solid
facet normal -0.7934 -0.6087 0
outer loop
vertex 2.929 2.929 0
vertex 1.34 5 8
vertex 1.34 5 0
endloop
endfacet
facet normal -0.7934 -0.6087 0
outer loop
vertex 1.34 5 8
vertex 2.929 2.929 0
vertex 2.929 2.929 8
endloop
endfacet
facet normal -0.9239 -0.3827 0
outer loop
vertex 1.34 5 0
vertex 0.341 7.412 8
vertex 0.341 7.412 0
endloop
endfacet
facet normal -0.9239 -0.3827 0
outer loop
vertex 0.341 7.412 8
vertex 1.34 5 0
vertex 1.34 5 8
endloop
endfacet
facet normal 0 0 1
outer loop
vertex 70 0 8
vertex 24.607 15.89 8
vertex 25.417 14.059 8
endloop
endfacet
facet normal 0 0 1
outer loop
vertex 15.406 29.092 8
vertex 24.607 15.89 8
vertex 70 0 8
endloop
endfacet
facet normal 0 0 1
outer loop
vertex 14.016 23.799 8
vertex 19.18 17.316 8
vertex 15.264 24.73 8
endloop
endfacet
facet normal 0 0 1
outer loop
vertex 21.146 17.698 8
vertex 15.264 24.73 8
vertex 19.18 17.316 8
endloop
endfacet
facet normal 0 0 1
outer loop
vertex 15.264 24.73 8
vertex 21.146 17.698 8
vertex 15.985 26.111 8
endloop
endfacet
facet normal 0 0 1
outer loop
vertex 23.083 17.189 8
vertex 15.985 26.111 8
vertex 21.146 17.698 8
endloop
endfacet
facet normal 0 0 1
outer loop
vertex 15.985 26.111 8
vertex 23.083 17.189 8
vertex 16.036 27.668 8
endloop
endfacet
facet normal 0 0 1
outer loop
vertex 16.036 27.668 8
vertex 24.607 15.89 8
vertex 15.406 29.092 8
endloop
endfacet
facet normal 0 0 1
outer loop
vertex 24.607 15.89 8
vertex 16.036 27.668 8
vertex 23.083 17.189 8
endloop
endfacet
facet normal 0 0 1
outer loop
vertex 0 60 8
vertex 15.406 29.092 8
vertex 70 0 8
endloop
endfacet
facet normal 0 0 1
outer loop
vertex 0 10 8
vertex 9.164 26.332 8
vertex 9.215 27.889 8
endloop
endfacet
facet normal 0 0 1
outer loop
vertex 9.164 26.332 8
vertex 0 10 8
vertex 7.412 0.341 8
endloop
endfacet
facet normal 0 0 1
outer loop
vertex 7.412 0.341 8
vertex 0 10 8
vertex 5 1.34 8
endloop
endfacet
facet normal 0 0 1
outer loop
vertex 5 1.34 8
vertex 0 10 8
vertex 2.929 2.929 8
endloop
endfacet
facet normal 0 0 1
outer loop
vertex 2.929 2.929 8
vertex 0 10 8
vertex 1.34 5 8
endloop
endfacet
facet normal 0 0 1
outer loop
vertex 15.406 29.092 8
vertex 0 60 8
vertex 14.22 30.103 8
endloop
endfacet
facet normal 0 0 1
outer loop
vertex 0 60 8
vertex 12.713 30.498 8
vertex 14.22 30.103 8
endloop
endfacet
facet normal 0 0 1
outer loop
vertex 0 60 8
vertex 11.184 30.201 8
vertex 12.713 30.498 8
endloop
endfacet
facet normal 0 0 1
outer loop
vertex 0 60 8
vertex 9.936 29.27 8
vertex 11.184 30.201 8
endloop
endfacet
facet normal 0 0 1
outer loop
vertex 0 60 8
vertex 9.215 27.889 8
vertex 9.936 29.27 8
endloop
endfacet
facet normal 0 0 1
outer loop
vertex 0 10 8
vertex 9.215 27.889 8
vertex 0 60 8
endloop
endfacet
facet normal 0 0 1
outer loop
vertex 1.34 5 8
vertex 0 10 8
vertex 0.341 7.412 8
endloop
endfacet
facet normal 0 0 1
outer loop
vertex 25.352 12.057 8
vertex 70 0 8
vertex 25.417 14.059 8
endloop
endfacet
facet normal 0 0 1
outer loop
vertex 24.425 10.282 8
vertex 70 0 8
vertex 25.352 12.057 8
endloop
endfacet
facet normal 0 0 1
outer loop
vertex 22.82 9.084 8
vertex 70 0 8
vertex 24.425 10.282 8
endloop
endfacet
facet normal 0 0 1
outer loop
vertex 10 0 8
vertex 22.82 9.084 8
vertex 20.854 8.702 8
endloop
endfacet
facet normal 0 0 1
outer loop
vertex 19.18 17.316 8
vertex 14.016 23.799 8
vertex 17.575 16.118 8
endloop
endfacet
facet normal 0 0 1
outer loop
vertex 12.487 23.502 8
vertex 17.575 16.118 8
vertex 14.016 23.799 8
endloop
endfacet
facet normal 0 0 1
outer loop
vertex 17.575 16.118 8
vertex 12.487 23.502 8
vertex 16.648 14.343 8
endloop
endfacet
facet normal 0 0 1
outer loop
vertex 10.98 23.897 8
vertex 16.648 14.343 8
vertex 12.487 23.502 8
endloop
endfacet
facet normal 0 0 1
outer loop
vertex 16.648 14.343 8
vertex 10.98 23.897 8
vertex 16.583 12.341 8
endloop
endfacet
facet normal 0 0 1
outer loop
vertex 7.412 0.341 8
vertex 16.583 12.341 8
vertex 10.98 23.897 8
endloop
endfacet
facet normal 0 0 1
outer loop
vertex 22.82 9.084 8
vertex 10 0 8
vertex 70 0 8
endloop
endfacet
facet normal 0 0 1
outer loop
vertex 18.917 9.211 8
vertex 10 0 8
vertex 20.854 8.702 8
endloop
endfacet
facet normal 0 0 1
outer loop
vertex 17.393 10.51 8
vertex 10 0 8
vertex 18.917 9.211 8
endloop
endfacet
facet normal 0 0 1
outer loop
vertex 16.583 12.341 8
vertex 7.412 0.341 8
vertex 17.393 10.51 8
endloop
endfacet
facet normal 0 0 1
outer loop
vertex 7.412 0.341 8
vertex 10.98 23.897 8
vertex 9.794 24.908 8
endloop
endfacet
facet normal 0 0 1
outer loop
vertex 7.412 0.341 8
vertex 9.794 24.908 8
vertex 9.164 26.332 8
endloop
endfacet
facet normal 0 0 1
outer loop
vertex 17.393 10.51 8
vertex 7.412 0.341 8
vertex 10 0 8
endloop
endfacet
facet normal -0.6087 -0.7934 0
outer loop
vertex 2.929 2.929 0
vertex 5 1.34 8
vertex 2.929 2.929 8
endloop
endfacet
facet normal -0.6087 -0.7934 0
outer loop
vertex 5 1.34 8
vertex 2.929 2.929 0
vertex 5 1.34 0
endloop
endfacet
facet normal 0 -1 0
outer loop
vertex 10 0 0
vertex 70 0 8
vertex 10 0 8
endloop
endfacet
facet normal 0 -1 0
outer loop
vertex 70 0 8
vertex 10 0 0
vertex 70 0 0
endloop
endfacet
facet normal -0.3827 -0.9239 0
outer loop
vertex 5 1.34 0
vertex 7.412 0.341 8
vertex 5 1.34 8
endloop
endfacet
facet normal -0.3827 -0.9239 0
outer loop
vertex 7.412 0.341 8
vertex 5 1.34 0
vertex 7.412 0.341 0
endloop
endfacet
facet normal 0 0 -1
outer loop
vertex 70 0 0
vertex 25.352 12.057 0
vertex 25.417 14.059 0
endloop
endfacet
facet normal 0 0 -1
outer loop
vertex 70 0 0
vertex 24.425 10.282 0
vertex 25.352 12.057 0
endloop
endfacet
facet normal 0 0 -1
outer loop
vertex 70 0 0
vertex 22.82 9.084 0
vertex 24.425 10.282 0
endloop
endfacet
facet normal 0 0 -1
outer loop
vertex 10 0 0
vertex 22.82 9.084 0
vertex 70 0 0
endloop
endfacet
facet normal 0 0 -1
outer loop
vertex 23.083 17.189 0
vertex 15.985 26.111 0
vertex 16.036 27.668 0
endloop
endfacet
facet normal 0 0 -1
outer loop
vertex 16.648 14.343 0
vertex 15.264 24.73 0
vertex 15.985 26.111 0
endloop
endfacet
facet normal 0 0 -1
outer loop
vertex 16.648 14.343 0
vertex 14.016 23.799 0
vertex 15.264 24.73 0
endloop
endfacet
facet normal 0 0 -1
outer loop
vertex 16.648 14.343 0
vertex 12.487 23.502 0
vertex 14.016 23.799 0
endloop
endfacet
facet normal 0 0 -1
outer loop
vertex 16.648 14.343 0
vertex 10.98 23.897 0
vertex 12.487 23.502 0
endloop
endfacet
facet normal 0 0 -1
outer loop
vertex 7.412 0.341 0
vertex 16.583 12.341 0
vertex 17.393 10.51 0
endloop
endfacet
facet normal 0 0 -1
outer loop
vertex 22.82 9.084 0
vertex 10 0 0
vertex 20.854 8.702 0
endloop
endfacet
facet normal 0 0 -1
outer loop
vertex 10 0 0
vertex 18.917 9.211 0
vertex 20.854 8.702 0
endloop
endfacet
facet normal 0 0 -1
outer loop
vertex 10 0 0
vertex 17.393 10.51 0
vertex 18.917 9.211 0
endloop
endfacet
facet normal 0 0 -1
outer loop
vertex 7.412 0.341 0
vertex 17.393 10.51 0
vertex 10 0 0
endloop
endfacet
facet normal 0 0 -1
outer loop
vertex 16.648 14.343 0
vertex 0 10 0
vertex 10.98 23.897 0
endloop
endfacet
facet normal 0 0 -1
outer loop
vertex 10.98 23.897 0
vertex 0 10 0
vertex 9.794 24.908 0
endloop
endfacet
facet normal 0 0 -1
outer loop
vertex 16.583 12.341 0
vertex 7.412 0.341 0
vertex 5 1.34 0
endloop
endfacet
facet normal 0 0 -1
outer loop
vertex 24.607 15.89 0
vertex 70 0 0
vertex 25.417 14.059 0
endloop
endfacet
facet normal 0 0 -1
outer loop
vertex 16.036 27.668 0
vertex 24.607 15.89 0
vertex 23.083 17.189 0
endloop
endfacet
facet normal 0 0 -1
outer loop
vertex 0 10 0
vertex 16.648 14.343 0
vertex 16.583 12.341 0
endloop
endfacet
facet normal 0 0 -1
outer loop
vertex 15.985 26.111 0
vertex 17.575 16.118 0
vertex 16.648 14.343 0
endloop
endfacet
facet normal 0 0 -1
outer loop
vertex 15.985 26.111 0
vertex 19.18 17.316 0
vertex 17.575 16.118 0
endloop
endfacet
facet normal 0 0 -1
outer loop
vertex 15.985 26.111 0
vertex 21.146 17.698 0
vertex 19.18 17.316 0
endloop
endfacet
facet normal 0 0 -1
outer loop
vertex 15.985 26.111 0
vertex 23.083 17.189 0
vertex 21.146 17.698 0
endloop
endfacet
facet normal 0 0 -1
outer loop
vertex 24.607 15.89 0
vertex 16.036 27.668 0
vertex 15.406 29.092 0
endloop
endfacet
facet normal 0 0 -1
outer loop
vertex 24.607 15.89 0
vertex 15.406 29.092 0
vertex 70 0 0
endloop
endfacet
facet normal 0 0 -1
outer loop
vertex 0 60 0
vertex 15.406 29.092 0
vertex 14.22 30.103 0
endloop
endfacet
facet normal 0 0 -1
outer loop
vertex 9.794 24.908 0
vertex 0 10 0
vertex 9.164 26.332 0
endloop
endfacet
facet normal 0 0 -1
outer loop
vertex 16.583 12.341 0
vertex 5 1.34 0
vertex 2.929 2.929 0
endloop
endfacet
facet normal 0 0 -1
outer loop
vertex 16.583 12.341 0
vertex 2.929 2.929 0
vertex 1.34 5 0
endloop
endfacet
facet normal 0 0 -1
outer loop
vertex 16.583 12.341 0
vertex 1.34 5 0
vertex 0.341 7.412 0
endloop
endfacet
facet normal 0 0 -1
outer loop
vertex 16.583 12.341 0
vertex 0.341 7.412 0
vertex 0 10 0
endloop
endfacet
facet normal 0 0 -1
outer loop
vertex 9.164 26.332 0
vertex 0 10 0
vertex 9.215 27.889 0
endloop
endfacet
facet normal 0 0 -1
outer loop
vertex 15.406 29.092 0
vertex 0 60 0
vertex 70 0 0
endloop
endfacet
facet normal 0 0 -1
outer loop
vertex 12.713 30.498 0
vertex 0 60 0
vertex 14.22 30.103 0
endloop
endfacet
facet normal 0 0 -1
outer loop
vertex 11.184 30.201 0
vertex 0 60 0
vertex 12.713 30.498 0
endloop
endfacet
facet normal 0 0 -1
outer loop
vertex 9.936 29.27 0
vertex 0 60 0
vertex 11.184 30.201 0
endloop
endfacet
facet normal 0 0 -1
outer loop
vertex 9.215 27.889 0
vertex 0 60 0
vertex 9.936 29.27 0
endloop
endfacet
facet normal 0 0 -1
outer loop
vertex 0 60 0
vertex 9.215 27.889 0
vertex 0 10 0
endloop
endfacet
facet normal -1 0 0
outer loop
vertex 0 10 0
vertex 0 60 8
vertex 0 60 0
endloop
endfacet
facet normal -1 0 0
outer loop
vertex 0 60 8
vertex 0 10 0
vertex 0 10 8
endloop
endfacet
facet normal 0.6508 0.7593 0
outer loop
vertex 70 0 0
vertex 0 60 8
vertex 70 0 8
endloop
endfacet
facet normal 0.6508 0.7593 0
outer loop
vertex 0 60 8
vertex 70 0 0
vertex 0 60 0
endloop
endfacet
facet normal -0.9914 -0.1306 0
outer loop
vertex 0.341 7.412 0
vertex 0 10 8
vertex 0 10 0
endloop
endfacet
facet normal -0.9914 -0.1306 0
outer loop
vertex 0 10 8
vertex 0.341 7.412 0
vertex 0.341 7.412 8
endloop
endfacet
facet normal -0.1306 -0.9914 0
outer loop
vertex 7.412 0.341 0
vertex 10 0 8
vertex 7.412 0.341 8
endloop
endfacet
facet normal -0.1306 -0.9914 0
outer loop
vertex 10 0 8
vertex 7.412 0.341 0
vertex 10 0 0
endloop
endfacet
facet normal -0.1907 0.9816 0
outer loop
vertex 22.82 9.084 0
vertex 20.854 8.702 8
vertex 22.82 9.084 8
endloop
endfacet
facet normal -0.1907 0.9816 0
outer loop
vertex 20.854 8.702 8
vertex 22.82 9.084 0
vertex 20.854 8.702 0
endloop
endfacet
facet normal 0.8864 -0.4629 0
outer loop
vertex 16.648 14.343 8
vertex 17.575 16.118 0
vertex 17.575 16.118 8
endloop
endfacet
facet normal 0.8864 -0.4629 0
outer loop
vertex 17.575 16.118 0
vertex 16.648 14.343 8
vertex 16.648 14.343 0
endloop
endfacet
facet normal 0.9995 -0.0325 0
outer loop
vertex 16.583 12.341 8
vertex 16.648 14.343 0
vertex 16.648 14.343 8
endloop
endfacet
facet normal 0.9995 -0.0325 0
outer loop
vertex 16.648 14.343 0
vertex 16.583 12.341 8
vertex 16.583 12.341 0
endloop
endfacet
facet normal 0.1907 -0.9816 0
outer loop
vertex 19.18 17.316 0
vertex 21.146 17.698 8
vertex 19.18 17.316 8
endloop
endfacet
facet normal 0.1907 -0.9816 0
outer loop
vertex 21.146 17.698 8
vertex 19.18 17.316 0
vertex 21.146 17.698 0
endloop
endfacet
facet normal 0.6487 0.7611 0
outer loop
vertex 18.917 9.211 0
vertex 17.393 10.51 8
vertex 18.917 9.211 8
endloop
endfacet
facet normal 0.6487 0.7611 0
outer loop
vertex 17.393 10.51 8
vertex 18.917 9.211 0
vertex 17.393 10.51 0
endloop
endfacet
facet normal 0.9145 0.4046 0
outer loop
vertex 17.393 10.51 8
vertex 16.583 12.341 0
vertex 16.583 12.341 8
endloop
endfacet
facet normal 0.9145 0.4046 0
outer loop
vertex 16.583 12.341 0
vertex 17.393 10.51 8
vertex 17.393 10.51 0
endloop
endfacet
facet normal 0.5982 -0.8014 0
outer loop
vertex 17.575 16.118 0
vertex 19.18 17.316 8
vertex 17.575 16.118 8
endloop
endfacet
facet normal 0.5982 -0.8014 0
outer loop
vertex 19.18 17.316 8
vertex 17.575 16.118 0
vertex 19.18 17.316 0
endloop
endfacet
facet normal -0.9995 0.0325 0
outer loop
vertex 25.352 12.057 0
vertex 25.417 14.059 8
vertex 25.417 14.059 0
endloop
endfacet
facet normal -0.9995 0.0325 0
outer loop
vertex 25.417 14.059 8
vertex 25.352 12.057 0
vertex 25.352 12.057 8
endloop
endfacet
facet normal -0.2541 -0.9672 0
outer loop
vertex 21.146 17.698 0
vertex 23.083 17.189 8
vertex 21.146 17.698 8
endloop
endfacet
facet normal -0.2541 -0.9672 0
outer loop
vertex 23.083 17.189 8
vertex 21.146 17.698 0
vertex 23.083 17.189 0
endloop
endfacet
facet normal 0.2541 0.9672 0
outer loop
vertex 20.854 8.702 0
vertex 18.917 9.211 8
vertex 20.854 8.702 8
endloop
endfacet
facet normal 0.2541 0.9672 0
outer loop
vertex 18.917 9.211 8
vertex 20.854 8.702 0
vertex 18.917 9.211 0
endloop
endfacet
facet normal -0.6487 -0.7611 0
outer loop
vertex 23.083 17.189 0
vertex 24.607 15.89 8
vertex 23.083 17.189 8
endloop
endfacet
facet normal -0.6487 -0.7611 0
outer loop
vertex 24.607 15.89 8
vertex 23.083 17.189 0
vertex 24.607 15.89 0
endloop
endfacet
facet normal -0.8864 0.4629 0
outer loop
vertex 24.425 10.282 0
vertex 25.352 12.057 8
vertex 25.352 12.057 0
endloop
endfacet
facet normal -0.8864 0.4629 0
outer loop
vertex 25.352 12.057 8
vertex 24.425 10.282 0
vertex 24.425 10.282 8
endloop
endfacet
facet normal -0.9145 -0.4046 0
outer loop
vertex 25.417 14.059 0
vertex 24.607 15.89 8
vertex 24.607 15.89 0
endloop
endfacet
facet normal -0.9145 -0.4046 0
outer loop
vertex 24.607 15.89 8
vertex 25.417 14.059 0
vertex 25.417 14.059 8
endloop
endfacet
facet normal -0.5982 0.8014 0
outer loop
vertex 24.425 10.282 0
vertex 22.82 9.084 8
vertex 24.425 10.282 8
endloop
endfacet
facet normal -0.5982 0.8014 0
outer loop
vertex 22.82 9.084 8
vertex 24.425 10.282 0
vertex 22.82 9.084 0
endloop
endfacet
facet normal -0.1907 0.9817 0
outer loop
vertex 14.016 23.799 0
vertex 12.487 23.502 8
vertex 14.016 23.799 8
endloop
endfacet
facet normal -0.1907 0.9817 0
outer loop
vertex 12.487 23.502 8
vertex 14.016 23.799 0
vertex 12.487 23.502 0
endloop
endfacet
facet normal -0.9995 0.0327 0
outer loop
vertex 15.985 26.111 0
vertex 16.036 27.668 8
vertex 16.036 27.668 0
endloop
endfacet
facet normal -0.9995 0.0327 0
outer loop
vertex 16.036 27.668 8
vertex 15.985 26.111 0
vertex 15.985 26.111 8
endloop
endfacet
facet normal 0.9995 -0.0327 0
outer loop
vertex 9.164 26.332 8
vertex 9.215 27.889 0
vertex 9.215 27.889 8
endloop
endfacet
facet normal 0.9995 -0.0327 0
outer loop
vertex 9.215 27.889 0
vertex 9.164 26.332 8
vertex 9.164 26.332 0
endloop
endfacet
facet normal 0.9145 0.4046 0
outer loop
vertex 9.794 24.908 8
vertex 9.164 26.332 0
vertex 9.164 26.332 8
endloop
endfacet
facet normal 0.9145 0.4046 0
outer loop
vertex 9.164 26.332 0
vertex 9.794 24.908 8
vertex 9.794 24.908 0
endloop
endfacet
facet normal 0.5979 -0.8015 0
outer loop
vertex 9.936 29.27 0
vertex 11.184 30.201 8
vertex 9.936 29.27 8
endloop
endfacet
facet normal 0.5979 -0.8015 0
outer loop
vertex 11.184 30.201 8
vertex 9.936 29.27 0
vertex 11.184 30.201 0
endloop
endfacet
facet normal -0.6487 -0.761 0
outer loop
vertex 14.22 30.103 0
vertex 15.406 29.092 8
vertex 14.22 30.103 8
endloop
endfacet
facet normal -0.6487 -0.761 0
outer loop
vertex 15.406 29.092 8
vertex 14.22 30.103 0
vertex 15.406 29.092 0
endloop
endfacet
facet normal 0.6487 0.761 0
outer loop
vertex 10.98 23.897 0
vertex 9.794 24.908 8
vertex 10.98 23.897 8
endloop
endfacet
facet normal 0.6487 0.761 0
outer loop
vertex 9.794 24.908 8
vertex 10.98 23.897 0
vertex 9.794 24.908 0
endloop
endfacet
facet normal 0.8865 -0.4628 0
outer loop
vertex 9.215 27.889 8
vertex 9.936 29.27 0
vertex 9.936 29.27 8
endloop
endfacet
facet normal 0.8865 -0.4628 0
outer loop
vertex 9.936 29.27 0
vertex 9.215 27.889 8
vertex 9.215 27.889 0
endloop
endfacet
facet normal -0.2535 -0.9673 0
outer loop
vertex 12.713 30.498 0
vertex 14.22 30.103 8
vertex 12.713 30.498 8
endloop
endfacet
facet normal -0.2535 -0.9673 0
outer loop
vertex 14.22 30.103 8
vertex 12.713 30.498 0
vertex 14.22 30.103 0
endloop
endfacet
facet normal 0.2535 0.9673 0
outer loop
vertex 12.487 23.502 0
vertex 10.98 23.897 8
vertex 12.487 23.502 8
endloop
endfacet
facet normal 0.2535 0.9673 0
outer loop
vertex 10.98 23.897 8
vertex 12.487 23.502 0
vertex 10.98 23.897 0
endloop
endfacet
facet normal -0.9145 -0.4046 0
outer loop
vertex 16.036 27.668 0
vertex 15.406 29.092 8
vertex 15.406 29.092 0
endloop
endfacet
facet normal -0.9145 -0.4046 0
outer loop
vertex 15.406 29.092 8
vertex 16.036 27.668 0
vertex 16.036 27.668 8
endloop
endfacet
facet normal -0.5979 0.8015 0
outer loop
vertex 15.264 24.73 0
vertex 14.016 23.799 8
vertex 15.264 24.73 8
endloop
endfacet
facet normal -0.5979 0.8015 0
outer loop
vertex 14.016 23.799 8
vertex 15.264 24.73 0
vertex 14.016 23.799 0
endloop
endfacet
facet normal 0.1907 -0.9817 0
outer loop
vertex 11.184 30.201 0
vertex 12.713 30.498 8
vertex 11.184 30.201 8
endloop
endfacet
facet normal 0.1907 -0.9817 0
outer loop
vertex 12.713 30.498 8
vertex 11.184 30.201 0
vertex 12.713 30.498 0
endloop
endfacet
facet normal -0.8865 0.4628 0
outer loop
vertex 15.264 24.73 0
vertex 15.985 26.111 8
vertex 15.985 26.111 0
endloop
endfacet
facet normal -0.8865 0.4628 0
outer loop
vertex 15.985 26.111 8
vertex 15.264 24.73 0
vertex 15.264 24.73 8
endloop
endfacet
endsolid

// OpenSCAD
$fn = 32;

// ----------------------------------------------------------------------
// Bracket plate: corner pad 70 x 60, fillet R10
// ----------------------------------------------------------------------

// --- parameters (mm) ---
hole_r = 3.5;             // bolt hole radius
plate_t = 8;              // plate thickness, Z (extrusion height)
leg_a = 70;               // base leg
leg_b = 60;               // height leg
fillet_r = 10;            // right-angle fillet radius

hole_d1 = 2 * hole_r + 2;
hole_d2 = 2 * hole_r;

profile = [[10, 0], [70, 0], [0, 60], [0, 10], [0.341, 7.412], [1.34, 5], [2.929, 2.929], [5, 1.34], [7.412, 0.341]];  // primary outline, 9 points, counter clockwise
void_1 = [[25.417, 14.059], [24.607, 15.89], [23.083, 17.189], [21.146, 17.698], [19.18, 17.316], [17.575, 16.118], [16.648, 14.343], [16.583, 12.341], [17.393, 10.51], [18.917, 9.211], [20.854, 8.702], [22.82, 9.084], [24.425, 10.282], [25.352, 12.057]];  // mount hole 1, 14 points
void_2 = [[16.036, 27.668], [15.406, 29.092], [14.22, 30.103], [12.713, 30.498], [11.184, 30.201], [9.936, 29.27], [9.215, 27.889], [9.164, 26.332], [9.794, 24.908], [10.98, 23.897], [12.487, 23.502], [14.016, 23.799], [15.264, 24.73], [15.985, 26.111]];  // mount hole 2, 14 points

// --- the one profile operation ---
difference() {
  linear_extrude(height = plate_t) polygon(points = profile);
  translate([0, 0, -1])
    linear_extrude(height = plate_t + 2) polygon(points = void_1);
  translate([0, 0, -1])
    linear_extrude(height = plate_t + 2) polygon(points = void_2);
}
